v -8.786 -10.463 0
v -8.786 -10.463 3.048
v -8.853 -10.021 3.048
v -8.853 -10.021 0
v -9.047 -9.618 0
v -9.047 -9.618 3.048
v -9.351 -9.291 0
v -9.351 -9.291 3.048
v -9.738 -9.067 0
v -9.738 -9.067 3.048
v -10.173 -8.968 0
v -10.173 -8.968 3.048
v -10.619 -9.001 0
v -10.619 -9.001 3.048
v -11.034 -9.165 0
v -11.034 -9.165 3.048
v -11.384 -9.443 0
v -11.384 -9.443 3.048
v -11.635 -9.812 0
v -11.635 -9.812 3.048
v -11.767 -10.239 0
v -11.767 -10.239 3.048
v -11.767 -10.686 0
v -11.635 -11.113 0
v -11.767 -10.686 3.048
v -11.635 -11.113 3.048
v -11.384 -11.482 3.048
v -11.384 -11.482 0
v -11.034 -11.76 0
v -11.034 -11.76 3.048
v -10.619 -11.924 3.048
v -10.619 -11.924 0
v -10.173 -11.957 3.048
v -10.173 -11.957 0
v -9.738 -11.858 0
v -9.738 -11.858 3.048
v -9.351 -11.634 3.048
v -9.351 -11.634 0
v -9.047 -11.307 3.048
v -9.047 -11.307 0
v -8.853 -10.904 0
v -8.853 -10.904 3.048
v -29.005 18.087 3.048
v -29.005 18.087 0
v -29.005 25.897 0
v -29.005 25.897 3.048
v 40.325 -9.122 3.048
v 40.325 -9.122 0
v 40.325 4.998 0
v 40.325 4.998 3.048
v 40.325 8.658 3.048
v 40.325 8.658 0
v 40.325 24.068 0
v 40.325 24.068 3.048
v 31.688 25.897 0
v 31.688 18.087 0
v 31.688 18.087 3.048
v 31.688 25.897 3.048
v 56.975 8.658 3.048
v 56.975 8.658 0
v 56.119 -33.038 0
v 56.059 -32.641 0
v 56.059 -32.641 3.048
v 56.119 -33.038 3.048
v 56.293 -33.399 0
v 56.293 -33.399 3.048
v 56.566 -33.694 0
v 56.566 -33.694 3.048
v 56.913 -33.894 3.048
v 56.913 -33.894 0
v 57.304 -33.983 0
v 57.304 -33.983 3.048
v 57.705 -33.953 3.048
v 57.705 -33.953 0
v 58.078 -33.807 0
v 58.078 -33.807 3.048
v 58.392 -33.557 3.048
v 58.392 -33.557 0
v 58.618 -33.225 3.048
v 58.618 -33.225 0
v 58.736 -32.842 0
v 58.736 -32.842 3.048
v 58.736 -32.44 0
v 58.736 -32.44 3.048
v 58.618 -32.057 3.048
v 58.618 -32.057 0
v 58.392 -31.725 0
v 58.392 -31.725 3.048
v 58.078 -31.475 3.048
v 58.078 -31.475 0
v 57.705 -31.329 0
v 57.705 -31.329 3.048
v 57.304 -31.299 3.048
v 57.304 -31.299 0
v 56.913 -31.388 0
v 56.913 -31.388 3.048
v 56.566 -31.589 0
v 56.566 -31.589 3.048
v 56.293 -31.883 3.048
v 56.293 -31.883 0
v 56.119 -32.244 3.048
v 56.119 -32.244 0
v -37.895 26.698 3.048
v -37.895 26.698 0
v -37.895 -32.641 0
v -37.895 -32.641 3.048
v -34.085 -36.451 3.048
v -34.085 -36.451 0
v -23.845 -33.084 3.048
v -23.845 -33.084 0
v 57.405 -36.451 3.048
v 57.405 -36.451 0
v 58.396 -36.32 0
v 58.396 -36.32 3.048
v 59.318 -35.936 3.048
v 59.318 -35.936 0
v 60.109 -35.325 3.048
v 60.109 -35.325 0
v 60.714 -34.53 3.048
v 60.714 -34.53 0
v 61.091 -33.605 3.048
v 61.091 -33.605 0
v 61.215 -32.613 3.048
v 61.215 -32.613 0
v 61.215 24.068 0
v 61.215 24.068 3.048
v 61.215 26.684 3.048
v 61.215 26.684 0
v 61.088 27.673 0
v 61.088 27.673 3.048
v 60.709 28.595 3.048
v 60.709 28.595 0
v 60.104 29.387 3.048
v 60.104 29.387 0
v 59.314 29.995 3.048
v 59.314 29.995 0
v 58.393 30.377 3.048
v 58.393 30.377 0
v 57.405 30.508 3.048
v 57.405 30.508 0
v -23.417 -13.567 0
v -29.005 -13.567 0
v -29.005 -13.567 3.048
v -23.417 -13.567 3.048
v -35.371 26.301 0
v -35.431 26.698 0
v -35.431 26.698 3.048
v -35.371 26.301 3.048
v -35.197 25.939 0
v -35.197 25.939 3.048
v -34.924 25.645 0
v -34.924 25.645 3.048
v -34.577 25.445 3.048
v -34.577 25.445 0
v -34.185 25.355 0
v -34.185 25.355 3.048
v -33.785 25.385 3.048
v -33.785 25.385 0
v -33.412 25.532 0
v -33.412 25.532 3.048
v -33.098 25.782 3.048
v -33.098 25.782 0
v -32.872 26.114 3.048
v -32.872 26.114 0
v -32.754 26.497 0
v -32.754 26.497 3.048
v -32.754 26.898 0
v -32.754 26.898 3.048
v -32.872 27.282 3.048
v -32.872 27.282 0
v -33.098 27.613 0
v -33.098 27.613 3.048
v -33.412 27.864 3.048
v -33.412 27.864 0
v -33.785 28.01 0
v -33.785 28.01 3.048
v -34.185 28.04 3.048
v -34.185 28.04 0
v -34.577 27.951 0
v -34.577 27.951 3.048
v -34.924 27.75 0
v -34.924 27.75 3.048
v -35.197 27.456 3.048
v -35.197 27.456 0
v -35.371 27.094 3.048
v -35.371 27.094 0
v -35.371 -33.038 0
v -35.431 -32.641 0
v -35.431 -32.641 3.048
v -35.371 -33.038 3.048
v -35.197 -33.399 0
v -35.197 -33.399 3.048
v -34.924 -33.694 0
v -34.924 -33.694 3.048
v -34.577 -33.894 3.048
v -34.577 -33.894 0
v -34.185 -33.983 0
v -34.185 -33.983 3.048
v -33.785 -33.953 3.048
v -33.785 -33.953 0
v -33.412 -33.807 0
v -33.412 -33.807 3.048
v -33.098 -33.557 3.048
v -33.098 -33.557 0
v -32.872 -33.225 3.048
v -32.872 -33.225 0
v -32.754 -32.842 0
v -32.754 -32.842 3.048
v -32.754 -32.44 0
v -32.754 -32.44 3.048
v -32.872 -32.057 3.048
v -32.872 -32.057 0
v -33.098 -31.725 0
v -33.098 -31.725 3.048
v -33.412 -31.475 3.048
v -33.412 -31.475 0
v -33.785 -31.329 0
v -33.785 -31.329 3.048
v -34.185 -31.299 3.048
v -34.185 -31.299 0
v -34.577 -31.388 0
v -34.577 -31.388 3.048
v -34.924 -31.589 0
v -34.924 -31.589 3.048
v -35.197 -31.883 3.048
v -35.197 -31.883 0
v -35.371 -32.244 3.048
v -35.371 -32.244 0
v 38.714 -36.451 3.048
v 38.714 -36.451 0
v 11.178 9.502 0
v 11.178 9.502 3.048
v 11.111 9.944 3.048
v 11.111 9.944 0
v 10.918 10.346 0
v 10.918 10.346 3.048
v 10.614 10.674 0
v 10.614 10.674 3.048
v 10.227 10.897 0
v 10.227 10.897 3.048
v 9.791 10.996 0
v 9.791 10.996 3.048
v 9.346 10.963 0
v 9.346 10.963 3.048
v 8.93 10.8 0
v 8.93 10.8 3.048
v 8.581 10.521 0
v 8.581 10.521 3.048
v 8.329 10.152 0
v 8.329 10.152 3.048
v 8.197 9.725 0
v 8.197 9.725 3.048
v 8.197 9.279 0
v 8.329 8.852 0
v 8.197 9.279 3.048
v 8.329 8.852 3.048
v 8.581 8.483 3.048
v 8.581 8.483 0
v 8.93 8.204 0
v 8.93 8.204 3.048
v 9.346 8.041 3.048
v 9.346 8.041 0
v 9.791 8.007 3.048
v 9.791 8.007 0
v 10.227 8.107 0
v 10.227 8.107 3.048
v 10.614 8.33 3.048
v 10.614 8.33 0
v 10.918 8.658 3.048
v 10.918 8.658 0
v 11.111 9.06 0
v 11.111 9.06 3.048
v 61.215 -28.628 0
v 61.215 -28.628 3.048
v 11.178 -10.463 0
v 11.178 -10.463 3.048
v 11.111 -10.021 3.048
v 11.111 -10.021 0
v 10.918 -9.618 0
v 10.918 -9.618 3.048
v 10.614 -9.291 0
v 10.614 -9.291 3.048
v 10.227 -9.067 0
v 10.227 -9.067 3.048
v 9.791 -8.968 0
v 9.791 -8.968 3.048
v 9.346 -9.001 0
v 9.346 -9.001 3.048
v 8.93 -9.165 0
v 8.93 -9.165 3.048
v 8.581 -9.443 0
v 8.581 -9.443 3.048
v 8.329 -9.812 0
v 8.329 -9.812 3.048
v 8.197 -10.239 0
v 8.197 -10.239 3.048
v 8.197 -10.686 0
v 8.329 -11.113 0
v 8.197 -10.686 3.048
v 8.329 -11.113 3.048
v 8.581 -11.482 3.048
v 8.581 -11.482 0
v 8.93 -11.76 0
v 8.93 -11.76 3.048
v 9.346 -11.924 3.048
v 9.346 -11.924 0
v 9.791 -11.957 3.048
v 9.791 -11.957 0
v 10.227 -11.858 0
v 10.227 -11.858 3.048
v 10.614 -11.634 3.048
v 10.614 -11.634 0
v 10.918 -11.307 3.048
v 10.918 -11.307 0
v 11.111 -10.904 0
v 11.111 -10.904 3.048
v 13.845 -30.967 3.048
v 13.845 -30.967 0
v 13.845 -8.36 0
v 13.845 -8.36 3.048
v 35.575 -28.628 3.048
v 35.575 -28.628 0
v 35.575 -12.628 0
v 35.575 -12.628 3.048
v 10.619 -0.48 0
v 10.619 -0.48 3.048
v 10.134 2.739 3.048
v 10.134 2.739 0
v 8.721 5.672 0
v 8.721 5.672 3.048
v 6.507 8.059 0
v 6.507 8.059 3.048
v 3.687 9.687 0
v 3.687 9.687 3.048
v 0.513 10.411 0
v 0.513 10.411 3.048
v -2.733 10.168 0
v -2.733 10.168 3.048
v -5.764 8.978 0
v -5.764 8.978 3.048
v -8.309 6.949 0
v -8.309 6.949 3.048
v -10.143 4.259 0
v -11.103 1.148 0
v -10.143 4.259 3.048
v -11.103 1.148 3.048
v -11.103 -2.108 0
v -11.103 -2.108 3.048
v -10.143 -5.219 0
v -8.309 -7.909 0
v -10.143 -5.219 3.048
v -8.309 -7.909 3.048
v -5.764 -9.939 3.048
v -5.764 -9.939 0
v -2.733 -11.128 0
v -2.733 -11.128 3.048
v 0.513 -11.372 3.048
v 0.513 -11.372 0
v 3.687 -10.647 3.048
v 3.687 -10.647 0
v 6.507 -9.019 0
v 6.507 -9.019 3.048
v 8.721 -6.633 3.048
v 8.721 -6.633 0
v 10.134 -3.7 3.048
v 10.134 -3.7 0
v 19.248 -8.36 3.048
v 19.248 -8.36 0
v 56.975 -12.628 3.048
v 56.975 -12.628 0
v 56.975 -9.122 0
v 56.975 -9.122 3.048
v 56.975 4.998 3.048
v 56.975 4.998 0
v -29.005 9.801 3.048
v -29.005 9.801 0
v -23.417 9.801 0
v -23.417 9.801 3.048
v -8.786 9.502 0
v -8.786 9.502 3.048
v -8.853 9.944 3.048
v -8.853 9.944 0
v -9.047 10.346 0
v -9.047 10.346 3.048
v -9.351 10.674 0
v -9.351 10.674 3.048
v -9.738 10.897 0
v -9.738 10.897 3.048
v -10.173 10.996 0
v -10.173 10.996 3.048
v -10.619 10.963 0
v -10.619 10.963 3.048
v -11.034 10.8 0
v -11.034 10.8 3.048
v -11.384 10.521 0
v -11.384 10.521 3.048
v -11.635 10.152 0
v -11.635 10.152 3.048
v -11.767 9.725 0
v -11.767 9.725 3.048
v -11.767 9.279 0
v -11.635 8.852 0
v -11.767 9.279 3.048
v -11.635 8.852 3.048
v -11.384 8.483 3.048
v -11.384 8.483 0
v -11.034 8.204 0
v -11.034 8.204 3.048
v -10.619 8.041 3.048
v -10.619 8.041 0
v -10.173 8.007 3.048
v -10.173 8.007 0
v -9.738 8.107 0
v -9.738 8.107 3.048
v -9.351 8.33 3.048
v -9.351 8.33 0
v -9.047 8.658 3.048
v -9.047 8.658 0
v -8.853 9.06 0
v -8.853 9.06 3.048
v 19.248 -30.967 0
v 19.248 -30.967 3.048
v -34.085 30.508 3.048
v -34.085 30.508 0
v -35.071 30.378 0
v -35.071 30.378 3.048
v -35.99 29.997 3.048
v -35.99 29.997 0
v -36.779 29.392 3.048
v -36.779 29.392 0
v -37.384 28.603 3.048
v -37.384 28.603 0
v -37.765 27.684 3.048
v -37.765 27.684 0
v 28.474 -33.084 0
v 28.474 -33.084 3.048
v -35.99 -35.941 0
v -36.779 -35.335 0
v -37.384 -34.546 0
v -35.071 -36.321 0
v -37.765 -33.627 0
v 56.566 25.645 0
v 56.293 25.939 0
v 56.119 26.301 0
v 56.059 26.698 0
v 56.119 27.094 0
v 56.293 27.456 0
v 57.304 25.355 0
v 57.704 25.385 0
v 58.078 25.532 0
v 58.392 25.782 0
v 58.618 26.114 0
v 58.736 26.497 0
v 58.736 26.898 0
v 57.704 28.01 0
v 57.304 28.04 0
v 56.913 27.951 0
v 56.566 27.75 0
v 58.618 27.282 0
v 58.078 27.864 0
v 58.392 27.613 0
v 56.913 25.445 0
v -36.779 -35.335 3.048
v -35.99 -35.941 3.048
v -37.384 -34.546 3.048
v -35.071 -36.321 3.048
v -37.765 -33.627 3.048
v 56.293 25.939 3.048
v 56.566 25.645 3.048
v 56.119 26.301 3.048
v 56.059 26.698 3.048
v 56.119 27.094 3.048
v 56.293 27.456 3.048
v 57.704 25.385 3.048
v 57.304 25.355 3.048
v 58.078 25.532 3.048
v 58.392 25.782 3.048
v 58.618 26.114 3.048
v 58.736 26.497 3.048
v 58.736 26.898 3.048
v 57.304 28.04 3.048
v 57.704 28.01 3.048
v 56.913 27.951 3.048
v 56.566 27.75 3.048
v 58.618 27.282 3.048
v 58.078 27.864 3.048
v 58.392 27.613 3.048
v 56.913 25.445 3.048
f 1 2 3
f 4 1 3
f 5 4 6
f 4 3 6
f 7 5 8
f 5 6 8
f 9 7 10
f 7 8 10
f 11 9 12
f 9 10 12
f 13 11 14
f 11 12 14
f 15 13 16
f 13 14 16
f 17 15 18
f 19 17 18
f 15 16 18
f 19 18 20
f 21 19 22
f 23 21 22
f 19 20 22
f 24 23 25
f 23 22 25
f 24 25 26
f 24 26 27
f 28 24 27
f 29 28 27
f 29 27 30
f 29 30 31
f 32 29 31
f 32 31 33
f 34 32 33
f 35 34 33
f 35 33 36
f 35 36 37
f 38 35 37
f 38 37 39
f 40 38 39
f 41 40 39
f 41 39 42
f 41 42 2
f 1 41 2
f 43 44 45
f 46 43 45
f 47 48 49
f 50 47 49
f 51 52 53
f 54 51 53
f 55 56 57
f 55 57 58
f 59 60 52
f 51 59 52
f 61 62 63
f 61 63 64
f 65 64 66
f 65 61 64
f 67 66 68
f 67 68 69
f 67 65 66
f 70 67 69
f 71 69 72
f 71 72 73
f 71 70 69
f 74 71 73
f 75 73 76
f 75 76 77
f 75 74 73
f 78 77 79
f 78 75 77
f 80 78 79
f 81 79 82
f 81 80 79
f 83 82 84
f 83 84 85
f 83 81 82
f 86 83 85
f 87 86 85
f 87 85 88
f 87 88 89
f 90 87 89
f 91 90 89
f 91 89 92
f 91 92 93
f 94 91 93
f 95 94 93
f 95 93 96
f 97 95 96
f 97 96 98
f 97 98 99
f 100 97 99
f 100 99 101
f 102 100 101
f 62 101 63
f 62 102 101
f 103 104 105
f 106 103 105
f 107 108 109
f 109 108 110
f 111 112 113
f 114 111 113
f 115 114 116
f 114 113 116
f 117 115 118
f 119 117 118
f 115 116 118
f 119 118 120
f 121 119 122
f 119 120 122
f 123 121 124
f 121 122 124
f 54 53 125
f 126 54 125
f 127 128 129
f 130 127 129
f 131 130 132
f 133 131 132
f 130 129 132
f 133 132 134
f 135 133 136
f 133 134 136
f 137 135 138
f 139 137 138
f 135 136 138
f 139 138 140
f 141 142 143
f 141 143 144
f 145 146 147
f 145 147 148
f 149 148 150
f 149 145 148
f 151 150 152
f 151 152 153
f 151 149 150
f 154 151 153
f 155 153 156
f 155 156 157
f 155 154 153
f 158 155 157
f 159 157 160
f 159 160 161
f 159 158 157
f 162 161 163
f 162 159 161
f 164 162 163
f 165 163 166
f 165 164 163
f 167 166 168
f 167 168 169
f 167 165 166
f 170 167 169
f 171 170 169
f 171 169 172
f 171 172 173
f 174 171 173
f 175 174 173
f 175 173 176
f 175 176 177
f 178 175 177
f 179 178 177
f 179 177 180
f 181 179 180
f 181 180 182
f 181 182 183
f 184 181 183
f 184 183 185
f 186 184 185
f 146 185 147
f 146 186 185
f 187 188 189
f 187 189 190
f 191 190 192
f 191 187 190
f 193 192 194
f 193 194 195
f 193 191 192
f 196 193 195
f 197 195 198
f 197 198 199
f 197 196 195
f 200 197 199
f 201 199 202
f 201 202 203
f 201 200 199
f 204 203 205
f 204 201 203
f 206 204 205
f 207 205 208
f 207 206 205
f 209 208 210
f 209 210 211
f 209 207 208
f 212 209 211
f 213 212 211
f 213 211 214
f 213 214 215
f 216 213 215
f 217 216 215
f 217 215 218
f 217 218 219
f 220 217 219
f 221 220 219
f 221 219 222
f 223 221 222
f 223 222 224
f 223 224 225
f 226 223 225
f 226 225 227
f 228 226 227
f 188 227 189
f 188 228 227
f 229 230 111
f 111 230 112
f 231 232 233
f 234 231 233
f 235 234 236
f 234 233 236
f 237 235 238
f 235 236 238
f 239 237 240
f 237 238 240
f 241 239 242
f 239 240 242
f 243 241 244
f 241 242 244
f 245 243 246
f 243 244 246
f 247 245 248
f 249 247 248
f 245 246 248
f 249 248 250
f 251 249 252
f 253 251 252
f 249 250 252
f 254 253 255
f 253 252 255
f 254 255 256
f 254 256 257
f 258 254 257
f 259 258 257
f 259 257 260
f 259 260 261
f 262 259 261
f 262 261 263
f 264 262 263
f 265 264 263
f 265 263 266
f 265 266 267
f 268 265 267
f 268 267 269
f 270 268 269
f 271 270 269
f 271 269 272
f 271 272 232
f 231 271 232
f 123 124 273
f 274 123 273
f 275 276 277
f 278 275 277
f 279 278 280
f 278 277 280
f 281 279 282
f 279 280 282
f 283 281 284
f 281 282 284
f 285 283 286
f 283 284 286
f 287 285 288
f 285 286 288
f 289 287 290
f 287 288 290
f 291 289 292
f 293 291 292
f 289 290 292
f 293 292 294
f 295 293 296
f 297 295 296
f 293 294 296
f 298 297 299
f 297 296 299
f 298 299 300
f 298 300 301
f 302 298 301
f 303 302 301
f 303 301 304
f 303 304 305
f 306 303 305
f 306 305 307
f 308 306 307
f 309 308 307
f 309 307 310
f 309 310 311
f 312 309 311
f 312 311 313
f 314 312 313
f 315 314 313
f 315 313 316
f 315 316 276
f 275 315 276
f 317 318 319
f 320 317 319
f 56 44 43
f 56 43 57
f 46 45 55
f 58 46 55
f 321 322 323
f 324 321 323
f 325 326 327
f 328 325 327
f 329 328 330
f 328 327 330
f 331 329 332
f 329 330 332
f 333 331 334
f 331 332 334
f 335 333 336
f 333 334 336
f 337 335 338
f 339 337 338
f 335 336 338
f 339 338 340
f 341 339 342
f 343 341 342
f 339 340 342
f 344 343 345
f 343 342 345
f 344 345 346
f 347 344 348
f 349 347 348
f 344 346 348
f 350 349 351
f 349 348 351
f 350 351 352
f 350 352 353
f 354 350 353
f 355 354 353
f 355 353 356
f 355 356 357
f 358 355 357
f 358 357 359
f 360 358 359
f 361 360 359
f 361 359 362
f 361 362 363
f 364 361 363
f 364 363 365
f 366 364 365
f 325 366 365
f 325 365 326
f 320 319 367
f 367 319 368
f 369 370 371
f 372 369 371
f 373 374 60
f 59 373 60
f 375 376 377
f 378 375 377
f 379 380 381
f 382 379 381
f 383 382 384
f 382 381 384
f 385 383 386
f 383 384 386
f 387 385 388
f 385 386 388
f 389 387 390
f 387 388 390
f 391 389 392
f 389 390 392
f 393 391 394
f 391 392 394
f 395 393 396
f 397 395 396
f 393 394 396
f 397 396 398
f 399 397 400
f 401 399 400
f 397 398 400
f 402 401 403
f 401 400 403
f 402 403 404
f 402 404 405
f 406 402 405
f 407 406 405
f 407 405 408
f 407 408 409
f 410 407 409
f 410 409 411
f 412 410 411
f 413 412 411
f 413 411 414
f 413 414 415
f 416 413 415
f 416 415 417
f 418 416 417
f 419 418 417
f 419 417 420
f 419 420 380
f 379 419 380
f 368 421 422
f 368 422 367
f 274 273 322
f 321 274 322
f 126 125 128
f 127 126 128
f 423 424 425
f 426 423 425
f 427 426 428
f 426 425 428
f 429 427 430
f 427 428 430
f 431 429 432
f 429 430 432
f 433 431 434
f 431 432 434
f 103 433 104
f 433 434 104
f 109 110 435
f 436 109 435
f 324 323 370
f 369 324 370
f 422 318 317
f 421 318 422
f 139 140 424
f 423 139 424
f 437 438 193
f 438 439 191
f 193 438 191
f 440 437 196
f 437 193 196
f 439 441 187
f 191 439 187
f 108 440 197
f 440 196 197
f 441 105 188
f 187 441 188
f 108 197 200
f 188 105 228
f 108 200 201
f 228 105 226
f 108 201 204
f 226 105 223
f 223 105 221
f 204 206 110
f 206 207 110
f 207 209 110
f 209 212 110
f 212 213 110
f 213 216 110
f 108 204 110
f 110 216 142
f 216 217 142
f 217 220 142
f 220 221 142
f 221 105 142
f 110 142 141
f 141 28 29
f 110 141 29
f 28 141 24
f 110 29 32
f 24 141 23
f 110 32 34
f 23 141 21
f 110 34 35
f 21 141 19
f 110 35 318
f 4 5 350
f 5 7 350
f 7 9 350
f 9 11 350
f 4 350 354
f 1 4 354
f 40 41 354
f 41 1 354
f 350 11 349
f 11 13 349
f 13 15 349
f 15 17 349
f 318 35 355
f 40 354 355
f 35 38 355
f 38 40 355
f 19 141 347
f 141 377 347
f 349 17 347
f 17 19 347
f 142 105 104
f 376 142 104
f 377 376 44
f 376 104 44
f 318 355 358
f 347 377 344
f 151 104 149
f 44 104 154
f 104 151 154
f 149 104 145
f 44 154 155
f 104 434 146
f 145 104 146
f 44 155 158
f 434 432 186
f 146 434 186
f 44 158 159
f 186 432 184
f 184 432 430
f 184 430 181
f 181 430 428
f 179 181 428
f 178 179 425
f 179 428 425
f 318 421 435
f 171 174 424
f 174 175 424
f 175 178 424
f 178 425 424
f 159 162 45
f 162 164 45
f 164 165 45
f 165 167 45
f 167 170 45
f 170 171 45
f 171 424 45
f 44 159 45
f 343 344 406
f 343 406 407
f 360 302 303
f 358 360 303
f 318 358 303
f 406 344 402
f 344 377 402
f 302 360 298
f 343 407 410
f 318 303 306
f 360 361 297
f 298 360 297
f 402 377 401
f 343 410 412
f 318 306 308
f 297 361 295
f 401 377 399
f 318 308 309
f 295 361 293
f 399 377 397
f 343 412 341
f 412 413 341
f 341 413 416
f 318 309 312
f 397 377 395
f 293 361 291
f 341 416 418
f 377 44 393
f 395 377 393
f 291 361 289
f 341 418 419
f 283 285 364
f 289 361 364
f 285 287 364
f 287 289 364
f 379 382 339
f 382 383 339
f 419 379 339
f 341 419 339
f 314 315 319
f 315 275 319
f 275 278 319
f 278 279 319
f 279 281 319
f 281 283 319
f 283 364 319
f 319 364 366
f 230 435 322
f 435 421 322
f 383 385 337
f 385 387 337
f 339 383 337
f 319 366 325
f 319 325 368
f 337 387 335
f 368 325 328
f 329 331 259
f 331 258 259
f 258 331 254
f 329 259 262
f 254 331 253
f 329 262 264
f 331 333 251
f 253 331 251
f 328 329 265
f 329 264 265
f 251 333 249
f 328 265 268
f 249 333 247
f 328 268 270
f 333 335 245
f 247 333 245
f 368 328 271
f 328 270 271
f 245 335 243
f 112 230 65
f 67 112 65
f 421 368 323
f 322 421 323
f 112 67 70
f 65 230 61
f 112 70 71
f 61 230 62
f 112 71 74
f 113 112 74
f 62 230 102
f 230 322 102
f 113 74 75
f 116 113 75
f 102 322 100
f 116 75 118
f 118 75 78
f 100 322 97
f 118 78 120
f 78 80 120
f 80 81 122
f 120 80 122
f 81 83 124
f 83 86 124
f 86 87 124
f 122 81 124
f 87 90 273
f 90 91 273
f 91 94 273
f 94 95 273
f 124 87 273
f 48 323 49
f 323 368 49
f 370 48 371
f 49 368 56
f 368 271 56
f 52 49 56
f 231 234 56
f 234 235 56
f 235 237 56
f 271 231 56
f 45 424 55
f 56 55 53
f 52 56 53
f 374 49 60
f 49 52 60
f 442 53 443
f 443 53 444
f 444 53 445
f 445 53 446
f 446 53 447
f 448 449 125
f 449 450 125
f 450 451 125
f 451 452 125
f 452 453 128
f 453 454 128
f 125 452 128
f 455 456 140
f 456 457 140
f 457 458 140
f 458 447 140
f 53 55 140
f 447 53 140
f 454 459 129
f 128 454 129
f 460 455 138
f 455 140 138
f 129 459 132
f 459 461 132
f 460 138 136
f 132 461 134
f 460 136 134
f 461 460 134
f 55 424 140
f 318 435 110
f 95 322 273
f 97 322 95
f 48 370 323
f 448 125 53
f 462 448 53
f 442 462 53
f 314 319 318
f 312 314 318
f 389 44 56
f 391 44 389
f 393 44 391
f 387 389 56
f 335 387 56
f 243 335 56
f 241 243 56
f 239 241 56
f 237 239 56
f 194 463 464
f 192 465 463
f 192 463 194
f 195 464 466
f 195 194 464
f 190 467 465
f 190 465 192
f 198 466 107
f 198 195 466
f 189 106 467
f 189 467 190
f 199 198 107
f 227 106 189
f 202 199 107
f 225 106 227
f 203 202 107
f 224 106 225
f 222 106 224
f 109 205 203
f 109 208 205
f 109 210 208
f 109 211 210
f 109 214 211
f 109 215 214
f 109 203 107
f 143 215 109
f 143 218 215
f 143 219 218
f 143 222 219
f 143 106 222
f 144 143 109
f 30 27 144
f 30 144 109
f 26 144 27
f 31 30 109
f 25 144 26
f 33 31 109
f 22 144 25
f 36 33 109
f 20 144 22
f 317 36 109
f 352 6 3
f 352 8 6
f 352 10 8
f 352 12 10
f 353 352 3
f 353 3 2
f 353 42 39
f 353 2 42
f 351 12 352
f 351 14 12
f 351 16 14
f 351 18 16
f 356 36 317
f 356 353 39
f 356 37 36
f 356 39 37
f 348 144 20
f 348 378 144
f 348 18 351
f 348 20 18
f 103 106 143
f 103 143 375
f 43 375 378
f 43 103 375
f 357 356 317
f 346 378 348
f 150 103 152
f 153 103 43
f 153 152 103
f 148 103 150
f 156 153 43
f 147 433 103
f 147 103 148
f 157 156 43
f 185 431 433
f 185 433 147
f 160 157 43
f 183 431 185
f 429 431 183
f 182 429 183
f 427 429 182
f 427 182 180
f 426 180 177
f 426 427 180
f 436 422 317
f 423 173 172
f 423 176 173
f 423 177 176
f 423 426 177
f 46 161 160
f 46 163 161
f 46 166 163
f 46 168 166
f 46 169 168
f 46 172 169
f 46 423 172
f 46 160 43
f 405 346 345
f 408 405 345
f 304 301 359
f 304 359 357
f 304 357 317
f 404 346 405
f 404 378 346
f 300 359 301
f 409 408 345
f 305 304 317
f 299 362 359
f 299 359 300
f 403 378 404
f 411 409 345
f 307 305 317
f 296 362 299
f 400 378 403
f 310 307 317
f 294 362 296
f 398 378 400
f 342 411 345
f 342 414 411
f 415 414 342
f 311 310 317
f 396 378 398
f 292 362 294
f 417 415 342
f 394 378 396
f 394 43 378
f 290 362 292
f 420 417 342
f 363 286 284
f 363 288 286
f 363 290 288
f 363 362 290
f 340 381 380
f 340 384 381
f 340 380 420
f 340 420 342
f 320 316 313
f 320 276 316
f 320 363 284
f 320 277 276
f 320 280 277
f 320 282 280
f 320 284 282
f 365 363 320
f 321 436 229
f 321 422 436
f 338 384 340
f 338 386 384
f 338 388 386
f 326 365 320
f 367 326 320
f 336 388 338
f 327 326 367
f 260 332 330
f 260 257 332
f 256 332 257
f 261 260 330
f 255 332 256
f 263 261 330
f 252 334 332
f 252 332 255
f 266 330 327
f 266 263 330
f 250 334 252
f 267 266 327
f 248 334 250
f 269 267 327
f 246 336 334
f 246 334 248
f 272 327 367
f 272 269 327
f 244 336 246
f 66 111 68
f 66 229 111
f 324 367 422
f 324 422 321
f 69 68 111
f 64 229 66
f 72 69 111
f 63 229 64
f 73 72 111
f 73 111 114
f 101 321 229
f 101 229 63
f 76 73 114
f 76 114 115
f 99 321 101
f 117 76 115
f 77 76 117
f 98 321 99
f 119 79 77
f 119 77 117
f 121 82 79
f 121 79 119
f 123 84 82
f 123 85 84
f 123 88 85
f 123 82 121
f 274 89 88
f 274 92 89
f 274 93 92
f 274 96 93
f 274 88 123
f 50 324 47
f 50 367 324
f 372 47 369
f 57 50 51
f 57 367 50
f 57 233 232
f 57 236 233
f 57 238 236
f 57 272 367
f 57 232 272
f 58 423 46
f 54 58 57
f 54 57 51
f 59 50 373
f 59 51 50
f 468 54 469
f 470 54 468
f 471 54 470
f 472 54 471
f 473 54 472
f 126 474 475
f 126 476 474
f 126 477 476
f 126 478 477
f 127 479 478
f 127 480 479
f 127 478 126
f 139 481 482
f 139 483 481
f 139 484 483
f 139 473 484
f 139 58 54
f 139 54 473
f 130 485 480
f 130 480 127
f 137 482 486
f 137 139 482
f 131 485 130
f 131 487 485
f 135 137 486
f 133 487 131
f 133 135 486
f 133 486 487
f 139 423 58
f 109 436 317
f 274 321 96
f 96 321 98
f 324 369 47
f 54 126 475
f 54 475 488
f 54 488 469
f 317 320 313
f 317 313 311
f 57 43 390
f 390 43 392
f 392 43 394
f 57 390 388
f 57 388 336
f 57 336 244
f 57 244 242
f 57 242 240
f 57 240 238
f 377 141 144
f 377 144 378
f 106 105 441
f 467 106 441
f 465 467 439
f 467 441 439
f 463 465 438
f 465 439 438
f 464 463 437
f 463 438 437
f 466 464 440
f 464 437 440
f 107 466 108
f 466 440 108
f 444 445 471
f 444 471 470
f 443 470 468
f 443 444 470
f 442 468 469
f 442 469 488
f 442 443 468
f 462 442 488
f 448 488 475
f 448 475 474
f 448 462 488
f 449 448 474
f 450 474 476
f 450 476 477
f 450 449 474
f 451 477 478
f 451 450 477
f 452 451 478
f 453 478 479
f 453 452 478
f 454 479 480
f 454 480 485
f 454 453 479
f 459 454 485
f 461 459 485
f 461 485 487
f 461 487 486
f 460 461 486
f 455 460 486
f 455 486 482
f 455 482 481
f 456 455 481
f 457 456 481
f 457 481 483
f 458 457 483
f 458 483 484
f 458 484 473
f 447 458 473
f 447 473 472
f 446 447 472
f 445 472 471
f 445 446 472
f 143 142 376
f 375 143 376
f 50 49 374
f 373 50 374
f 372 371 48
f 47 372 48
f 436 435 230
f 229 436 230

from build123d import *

# Parameters (mm, degrees)
SKETCH1_R           = 1.3462
SKETCH1_W           = 5.4034
SKETCH1_H           = 22.6066
SKETCH1_W_2         = 60.6932
SKETCH1_H_2         = 7.81
SKETCH1_W_3         = 5.588
SKETCH1_H_3         = 23.368
BOSS_EXTRUDE1_DEPTH = 3.048
SKETCH2_R           = 10.922
SKETCH2_R_2         = 1.4986
CUT_EXTRUDE1_DEPTH  = 72.310891511


with BuildPart() as part:
    # Sketch1 → Boss-Extrude1 (new body)
    with BuildSketch(Plane.XY):
        with BuildLine():
            Line((57.404932375, 30.507694304), (-34.084892625, 30.507694304))
            ThreePointArc((-34.084892625, 30.507694304), (-36.778969461, 29.391771141), (-37.894892625, 26.697694304))
            Line((-37.894892625, 26.697694304), (-37.894892625, -32.641005696))
            ThreePointArc((-37.894892625, -32.641005696), (-36.778969461, -35.335082532), (-34.084892625, -36.451005696))
            Line((-34.084892625, -36.451005696), (-23.844892625, -33.084405696))
            Line((-23.844892625, -33.084405696), (28.474307375, -33.084405696))
            Line((28.474307375, -33.084405696), (38.714307375, -36.451005696))
            Line((38.714307375, -36.451005696), (57.405007375, -36.451005696))
            ThreePointArc((57.405007375, -36.451005696), (60.108826144, -35.325305244), (61.214907375, -32.613401529))
            Line((61.214907375, -32.613401529), (61.214907375, -28.627805696))
            Line((61.214907375, -28.627805696), (35.575007375, -28.627805696))
            Line((35.575007375, -28.627805696), (35.575007375, -12.628005696))
            Line((35.575007375, -12.628005696), (56.975007375, -12.628005696))
            Line((56.975007375, -12.628005696), (56.975007375, -9.121805696))
            Line((56.975007375, -9.121805696), (40.325007375, -9.121805696))
            Line((40.325007375, -9.121805696), (40.325007375, 4.997894304))
            Line((40.325007375, 4.997894304), (56.975007375, 4.997894304))
            Line((56.975007375, 4.997894304), (56.975007375, 8.658194304))
            Line((56.975007375, 8.658194304), (40.325007375, 8.658194304))
            Line((40.325007375, 8.658194304), (40.325007375, 24.068294304))
            Line((40.325007375, 24.068294304), (61.214907375, 24.068294304))
            Line((61.214907375, 24.068294304), (61.214907375, 26.683892153))
            ThreePointArc((61.214907375, 26.683892153), (60.103884597, 29.386886916), (57.404932375, 30.507694304))
        make_face()
        with Locations(Location((57.405007375, -32.641005696, 0), (0, 0, 180))):
            Circle(SKETCH1_R, mode=Mode.SUBTRACT)
        with Locations(Location((-34.084892625, -32.641005696, 0), (0, 0, 180))):
            Circle(SKETCH1_R, mode=Mode.SUBTRACT)
        with Locations(Location((-34.084892625, 26.697694304, 0), (0, 0, 180))):
            Circle(SKETCH1_R, mode=Mode.SUBTRACT)
        with Locations(Location((57.404932375, 26.697694304, 0), (0, 0, 180))):
            Circle(SKETCH1_R, mode=Mode.SUBTRACT)
        with Locations((16.546707375, -19.663505696)):
            Rectangle(SKETCH1_W, SKETCH1_H, mode=Mode.SUBTRACT)
        with Locations((1.341707375, 21.991994304)):
            Rectangle(SKETCH1_W_2, SKETCH1_H_2, mode=Mode.SUBTRACT)
        with Locations((-26.210892625, -1.882805696)):
            Rectangle(SKETCH1_W_3, SKETCH1_H_3, mode=Mode.SUBTRACT)
    extrude(amount=BOSS_EXTRUDE1_DEPTH)

    # Sketch2 → Cut-Extrude1 (cut, through all)
    with BuildSketch(Plane.XY.offset(3.048)):
        with Locations((-0.302892625, -0.480305696)):
            Circle(SKETCH2_R)
        with Locations((-10.285092625, -10.462505696)):
            Circle(SKETCH2_R_2)
        with Locations((-10.285092625, 9.501894304)):
            Circle(SKETCH2_R_2)
        with Locations((9.679307375, -10.462505696)):
            Circle(SKETCH2_R_2)
        with Locations((9.679307375, 9.501894304)):
            Circle(SKETCH2_R_2)
    extrude(amount=-CUT_EXTRUDE1_DEPTH, mode=Mode.SUBTRACT)


solid = part.part
